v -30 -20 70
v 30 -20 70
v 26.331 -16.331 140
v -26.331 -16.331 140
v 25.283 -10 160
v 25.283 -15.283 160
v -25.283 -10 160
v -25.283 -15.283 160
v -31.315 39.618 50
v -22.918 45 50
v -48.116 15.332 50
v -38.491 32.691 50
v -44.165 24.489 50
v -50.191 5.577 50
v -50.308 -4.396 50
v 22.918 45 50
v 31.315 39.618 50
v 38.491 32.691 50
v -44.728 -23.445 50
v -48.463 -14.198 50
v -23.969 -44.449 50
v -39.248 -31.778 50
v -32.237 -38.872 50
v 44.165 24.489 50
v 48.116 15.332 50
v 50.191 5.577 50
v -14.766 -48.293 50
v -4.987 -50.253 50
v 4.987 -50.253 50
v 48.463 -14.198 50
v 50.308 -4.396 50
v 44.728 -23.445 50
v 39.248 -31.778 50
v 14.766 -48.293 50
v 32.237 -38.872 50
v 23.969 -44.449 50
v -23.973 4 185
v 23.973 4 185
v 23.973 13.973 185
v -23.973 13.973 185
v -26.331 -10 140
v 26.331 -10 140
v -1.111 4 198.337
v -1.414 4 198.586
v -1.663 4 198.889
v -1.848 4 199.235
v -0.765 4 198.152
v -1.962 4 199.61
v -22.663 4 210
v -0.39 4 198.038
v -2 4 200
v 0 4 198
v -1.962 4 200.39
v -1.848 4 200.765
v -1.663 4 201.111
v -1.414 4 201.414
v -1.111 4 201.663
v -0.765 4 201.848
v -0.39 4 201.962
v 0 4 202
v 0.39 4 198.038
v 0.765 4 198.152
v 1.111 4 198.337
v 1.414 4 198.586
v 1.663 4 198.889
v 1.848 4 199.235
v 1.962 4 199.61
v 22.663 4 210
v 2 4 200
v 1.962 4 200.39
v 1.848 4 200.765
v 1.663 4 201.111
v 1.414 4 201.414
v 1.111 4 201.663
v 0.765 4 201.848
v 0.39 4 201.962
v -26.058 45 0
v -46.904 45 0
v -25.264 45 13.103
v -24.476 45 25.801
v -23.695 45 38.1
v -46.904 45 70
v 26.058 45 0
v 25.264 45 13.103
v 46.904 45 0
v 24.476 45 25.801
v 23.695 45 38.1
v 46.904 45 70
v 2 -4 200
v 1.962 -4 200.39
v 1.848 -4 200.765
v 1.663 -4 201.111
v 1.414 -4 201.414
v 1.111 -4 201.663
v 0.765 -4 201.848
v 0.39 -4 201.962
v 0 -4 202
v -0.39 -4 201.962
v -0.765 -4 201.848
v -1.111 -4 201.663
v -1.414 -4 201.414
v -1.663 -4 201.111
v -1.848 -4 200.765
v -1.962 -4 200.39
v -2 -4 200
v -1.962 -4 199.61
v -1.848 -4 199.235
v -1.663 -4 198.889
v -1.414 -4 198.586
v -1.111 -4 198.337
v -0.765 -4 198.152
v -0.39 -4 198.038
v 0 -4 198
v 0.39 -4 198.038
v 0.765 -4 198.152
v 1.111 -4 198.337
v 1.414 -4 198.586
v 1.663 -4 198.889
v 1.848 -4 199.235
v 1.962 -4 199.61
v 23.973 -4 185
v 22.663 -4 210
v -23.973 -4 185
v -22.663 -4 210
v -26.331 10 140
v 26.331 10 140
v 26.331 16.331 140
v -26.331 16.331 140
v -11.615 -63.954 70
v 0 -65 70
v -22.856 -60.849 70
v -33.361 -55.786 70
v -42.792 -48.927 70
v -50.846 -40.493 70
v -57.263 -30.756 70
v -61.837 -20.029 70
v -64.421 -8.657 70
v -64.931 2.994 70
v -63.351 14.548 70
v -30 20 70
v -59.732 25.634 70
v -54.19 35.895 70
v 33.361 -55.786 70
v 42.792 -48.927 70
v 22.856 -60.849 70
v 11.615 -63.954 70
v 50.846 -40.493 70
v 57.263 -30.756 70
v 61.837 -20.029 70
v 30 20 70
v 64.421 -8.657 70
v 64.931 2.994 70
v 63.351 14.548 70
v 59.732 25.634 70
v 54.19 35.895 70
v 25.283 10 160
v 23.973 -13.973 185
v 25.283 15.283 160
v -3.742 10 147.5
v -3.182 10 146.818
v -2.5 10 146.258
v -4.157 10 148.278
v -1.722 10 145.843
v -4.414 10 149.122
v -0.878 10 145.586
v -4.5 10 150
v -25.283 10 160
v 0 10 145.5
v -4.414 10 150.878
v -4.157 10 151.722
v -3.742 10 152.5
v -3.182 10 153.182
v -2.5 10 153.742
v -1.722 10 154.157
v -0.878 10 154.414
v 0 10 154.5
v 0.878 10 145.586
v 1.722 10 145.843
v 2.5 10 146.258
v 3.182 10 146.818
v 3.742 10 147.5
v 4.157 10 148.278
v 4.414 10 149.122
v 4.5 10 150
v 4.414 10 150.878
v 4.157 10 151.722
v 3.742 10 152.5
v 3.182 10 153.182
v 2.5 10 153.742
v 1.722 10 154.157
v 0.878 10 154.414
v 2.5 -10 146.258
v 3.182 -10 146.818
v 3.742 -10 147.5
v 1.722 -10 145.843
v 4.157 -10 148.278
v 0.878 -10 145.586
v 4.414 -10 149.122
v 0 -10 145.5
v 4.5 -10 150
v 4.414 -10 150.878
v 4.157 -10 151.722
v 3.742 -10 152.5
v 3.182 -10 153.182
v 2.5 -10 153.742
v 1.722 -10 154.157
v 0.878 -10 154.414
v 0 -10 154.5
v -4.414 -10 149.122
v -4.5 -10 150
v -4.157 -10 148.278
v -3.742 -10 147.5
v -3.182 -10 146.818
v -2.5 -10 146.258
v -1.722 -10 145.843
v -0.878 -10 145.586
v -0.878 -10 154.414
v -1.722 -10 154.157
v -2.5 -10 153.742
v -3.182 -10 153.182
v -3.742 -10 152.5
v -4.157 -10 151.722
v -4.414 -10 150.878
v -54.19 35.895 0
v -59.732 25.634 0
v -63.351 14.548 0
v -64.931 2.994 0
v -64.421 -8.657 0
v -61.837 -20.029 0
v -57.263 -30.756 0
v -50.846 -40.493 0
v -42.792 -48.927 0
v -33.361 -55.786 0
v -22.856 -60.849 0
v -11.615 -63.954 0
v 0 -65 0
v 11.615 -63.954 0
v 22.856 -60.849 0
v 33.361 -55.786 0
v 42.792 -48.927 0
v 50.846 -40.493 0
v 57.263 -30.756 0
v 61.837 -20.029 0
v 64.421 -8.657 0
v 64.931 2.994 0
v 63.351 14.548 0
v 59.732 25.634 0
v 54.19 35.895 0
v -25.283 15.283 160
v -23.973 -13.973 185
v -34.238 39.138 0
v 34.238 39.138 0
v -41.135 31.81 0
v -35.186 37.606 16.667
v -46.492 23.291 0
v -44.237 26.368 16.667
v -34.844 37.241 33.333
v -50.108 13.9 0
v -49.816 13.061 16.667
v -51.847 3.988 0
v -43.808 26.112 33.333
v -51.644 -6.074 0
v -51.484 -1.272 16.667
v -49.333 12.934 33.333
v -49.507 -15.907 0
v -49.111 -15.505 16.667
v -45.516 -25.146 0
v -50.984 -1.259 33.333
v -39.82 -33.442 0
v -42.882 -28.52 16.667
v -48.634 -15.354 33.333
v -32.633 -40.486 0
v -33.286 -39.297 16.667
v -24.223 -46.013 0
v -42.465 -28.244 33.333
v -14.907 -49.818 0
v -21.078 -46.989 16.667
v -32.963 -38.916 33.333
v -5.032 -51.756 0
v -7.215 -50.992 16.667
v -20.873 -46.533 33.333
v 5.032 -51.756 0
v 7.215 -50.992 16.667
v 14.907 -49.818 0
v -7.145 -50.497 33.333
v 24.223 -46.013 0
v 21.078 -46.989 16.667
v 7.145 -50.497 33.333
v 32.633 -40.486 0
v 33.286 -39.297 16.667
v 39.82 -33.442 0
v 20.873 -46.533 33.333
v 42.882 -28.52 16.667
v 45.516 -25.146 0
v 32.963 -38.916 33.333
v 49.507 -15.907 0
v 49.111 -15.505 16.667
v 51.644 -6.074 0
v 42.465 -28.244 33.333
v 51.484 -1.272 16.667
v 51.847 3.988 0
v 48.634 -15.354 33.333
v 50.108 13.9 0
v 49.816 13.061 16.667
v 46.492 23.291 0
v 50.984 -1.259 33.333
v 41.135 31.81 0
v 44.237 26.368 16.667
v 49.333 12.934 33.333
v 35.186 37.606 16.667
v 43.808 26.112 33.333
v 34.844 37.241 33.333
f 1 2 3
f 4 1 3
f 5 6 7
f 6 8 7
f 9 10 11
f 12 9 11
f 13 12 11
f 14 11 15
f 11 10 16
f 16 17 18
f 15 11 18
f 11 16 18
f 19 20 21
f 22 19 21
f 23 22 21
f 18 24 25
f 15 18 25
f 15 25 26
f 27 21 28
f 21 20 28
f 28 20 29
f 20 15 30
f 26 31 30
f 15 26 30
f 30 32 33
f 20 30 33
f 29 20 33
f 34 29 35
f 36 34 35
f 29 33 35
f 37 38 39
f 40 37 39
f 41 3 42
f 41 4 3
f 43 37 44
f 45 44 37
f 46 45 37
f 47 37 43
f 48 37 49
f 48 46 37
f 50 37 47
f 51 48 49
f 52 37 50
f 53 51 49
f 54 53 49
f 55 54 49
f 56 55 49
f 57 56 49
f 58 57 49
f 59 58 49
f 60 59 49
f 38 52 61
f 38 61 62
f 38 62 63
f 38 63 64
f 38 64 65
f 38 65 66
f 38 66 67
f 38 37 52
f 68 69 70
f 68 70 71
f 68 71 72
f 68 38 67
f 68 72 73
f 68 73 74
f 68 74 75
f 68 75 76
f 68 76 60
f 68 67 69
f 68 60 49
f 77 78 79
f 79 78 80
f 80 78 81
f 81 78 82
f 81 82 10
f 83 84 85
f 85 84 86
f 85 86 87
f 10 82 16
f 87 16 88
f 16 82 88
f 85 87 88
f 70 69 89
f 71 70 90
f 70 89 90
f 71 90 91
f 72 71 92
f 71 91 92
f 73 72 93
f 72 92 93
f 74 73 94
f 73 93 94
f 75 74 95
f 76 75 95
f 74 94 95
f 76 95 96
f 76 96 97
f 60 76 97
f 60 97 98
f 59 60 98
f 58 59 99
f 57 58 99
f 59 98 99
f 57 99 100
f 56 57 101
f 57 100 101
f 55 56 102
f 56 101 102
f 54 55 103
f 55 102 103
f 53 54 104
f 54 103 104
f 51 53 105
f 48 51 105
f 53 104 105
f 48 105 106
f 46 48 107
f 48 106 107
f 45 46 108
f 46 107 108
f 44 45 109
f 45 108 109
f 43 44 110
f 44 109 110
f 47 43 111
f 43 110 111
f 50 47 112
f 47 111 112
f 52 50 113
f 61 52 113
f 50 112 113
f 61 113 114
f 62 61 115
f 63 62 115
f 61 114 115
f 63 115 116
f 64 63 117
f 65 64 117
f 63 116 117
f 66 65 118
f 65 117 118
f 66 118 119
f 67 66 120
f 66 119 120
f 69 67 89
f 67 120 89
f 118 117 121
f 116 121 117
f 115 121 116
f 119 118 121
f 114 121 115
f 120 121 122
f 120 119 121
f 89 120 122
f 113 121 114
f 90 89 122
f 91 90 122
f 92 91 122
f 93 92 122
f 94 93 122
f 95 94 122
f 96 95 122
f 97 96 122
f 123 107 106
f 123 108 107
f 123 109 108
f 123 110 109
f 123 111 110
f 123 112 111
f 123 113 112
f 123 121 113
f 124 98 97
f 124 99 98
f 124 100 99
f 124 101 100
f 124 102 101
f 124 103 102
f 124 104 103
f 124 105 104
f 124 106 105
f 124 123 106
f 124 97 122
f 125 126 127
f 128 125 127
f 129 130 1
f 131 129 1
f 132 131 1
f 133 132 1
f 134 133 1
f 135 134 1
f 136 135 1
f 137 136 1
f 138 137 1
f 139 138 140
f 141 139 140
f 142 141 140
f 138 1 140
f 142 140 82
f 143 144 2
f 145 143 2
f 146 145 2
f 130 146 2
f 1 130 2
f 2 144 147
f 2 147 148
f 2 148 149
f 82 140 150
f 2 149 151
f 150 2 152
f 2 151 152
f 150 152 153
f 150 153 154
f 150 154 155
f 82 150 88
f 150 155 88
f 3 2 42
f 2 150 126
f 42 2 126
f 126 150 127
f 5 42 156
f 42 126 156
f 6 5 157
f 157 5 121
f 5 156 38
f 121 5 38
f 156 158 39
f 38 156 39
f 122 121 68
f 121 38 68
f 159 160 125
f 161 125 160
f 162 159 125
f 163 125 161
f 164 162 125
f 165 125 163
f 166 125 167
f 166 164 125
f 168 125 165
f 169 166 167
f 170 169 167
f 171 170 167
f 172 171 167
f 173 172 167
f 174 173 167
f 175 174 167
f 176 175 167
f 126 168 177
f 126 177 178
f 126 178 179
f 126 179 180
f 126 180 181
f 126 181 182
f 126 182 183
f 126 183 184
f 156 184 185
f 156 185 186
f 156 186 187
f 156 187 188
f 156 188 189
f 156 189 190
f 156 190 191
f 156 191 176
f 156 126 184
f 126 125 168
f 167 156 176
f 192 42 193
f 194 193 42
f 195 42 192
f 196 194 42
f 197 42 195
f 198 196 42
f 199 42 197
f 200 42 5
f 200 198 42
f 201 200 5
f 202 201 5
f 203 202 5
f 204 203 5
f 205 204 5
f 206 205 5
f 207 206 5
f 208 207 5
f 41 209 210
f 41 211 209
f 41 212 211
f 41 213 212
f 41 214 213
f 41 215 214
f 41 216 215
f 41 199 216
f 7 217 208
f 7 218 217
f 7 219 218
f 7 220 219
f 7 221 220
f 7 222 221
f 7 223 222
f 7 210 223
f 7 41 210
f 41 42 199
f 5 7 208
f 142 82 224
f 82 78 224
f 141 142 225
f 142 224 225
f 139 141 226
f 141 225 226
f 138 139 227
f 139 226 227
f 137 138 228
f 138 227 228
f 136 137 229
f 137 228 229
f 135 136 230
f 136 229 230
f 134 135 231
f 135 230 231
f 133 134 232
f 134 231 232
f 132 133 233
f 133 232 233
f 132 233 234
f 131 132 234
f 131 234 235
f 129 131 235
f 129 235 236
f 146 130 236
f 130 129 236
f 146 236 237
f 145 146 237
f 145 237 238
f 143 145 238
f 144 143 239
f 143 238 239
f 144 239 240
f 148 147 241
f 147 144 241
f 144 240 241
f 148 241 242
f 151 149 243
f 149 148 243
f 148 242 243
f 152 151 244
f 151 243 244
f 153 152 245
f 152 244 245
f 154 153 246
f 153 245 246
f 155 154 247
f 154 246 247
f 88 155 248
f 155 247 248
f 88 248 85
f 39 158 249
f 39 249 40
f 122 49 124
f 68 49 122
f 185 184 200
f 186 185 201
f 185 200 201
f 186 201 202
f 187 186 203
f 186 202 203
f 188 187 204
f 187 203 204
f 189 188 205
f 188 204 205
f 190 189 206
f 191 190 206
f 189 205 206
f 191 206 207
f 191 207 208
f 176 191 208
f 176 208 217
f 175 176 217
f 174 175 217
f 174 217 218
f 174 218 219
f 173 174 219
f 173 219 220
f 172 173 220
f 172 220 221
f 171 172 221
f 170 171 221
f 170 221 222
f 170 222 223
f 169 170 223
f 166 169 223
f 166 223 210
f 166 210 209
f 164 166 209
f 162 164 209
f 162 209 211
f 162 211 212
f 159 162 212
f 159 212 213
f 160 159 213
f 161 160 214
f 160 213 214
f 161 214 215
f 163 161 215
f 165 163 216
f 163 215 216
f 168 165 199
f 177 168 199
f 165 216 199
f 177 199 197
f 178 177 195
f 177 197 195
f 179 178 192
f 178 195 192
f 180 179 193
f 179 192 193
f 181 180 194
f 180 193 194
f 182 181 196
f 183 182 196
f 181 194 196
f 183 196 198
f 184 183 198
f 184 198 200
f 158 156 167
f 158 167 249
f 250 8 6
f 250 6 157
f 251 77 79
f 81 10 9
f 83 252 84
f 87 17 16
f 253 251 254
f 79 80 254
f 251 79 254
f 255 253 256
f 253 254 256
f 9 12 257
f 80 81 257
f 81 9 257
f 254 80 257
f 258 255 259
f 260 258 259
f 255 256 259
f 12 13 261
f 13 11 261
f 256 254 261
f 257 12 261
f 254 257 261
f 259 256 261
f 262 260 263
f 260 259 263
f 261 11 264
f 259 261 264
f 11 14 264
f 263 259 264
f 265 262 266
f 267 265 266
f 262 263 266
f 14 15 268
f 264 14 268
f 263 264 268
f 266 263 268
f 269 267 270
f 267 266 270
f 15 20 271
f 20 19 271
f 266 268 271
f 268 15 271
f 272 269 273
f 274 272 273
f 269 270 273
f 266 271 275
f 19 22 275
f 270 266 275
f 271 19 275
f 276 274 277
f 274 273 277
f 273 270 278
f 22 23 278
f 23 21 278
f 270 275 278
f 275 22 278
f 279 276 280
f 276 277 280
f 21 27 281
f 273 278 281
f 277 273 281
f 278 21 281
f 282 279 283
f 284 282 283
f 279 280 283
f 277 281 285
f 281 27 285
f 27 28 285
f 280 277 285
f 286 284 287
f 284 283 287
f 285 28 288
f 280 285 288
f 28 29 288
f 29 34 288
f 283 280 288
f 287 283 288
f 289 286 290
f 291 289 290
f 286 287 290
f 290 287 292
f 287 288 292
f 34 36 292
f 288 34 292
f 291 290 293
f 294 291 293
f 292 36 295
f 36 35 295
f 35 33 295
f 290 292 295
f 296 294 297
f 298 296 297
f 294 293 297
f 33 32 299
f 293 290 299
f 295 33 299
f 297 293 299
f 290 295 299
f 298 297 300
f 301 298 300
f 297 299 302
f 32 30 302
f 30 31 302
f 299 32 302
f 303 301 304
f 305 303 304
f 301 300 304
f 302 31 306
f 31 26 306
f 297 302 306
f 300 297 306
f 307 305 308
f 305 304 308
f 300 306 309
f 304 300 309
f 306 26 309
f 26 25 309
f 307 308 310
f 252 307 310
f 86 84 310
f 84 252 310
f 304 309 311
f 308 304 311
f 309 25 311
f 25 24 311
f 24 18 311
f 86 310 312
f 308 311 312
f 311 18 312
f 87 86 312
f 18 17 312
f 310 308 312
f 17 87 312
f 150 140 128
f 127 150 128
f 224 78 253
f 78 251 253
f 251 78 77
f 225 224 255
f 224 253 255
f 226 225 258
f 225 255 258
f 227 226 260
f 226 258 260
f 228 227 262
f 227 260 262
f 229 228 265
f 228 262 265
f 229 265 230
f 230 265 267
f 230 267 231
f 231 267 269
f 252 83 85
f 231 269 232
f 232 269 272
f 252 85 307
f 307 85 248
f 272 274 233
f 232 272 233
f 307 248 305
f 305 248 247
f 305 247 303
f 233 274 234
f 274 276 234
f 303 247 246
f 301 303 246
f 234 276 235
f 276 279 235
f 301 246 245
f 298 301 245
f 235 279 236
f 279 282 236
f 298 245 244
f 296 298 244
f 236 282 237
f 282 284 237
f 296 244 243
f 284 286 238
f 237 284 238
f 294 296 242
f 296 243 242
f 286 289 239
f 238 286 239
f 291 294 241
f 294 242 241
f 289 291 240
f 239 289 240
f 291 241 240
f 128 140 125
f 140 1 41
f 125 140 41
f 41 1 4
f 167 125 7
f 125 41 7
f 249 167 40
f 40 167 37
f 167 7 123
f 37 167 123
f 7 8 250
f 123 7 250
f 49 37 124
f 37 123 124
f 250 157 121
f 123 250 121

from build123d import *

# Parameters (mm, degrees)
F2_W      = 60
F2_H      = 40
F3_DEPTH  = 140
F3_TAPER  = 3
F4_W      = 30
F4_H      = 20
F5_DEPTH  = 150
F6_R      = 4.5
F6_R_2    = 2
F7_DEPTH  = 150
F8_W      = 30
F8_H      = 25
F9_DEPTH  = 150
F10_W     = 93.8083151965
F10_H     = 20
F11_DEPTH = 70.001


with BuildPart() as f1:
    # F0 (on Right) → F1 (revolve)
    with BuildSketch(Plane.YZ):
        Polygon((-65, 0), (-52, 0), (-50.5, 50), (0, 50), (0, 70), (-65, 70), align=None)
    revolve(axis=Axis((0, 0, 53.9928800981), (0, 0, 1)))

    # F2 (on face) → F3 (join)
    with BuildSketch(Plane.XY.offset(70)):
        Rectangle(F2_W, F2_H)
    extrude(amount=F3_DEPTH, taper=F3_TAPER)

    # F4 (on Right) → F5 (cut, symmetric)
    with BuildSketch(Plane.YZ):
        with Locations((-25, 150)):
            Rectangle(F4_W, F4_H)
        with Locations((25, 150)):
            Rectangle(F4_W, F4_H)
    extrude(amount=F5_DEPTH, both=True, mode=Mode.SUBTRACT)

    # F6 (on face) → F7 (cut, symmetric)
    with BuildSketch(Plane.XZ.offset(10)):
        with Locations((0, 150)):
            Circle(F6_R)
        with Locations((0, 200)):
            Circle(F6_R_2)
    extrude(amount=F7_DEPTH, both=True, mode=Mode.SUBTRACT)

    # F8 (on Right) → F9 (cut, symmetric)
    with BuildSketch(Plane.YZ):
        with Locations((-19, 197.5)):
            Rectangle(F8_W, F8_H)
        with Locations((19, 197.5)):
            Rectangle(F8_W, F8_H)
    extrude(amount=F9_DEPTH, both=True, mode=Mode.SUBTRACT)

    # F10 (on face) → F11 (cut, through all)
    with BuildSketch(Plane.XY.offset(70)):
        with Locations((0, 55)):
            Rectangle(F10_W, F10_H)
    extrude(amount=-F11_DEPTH, mode=Mode.SUBTRACT)


solid = f1.part
